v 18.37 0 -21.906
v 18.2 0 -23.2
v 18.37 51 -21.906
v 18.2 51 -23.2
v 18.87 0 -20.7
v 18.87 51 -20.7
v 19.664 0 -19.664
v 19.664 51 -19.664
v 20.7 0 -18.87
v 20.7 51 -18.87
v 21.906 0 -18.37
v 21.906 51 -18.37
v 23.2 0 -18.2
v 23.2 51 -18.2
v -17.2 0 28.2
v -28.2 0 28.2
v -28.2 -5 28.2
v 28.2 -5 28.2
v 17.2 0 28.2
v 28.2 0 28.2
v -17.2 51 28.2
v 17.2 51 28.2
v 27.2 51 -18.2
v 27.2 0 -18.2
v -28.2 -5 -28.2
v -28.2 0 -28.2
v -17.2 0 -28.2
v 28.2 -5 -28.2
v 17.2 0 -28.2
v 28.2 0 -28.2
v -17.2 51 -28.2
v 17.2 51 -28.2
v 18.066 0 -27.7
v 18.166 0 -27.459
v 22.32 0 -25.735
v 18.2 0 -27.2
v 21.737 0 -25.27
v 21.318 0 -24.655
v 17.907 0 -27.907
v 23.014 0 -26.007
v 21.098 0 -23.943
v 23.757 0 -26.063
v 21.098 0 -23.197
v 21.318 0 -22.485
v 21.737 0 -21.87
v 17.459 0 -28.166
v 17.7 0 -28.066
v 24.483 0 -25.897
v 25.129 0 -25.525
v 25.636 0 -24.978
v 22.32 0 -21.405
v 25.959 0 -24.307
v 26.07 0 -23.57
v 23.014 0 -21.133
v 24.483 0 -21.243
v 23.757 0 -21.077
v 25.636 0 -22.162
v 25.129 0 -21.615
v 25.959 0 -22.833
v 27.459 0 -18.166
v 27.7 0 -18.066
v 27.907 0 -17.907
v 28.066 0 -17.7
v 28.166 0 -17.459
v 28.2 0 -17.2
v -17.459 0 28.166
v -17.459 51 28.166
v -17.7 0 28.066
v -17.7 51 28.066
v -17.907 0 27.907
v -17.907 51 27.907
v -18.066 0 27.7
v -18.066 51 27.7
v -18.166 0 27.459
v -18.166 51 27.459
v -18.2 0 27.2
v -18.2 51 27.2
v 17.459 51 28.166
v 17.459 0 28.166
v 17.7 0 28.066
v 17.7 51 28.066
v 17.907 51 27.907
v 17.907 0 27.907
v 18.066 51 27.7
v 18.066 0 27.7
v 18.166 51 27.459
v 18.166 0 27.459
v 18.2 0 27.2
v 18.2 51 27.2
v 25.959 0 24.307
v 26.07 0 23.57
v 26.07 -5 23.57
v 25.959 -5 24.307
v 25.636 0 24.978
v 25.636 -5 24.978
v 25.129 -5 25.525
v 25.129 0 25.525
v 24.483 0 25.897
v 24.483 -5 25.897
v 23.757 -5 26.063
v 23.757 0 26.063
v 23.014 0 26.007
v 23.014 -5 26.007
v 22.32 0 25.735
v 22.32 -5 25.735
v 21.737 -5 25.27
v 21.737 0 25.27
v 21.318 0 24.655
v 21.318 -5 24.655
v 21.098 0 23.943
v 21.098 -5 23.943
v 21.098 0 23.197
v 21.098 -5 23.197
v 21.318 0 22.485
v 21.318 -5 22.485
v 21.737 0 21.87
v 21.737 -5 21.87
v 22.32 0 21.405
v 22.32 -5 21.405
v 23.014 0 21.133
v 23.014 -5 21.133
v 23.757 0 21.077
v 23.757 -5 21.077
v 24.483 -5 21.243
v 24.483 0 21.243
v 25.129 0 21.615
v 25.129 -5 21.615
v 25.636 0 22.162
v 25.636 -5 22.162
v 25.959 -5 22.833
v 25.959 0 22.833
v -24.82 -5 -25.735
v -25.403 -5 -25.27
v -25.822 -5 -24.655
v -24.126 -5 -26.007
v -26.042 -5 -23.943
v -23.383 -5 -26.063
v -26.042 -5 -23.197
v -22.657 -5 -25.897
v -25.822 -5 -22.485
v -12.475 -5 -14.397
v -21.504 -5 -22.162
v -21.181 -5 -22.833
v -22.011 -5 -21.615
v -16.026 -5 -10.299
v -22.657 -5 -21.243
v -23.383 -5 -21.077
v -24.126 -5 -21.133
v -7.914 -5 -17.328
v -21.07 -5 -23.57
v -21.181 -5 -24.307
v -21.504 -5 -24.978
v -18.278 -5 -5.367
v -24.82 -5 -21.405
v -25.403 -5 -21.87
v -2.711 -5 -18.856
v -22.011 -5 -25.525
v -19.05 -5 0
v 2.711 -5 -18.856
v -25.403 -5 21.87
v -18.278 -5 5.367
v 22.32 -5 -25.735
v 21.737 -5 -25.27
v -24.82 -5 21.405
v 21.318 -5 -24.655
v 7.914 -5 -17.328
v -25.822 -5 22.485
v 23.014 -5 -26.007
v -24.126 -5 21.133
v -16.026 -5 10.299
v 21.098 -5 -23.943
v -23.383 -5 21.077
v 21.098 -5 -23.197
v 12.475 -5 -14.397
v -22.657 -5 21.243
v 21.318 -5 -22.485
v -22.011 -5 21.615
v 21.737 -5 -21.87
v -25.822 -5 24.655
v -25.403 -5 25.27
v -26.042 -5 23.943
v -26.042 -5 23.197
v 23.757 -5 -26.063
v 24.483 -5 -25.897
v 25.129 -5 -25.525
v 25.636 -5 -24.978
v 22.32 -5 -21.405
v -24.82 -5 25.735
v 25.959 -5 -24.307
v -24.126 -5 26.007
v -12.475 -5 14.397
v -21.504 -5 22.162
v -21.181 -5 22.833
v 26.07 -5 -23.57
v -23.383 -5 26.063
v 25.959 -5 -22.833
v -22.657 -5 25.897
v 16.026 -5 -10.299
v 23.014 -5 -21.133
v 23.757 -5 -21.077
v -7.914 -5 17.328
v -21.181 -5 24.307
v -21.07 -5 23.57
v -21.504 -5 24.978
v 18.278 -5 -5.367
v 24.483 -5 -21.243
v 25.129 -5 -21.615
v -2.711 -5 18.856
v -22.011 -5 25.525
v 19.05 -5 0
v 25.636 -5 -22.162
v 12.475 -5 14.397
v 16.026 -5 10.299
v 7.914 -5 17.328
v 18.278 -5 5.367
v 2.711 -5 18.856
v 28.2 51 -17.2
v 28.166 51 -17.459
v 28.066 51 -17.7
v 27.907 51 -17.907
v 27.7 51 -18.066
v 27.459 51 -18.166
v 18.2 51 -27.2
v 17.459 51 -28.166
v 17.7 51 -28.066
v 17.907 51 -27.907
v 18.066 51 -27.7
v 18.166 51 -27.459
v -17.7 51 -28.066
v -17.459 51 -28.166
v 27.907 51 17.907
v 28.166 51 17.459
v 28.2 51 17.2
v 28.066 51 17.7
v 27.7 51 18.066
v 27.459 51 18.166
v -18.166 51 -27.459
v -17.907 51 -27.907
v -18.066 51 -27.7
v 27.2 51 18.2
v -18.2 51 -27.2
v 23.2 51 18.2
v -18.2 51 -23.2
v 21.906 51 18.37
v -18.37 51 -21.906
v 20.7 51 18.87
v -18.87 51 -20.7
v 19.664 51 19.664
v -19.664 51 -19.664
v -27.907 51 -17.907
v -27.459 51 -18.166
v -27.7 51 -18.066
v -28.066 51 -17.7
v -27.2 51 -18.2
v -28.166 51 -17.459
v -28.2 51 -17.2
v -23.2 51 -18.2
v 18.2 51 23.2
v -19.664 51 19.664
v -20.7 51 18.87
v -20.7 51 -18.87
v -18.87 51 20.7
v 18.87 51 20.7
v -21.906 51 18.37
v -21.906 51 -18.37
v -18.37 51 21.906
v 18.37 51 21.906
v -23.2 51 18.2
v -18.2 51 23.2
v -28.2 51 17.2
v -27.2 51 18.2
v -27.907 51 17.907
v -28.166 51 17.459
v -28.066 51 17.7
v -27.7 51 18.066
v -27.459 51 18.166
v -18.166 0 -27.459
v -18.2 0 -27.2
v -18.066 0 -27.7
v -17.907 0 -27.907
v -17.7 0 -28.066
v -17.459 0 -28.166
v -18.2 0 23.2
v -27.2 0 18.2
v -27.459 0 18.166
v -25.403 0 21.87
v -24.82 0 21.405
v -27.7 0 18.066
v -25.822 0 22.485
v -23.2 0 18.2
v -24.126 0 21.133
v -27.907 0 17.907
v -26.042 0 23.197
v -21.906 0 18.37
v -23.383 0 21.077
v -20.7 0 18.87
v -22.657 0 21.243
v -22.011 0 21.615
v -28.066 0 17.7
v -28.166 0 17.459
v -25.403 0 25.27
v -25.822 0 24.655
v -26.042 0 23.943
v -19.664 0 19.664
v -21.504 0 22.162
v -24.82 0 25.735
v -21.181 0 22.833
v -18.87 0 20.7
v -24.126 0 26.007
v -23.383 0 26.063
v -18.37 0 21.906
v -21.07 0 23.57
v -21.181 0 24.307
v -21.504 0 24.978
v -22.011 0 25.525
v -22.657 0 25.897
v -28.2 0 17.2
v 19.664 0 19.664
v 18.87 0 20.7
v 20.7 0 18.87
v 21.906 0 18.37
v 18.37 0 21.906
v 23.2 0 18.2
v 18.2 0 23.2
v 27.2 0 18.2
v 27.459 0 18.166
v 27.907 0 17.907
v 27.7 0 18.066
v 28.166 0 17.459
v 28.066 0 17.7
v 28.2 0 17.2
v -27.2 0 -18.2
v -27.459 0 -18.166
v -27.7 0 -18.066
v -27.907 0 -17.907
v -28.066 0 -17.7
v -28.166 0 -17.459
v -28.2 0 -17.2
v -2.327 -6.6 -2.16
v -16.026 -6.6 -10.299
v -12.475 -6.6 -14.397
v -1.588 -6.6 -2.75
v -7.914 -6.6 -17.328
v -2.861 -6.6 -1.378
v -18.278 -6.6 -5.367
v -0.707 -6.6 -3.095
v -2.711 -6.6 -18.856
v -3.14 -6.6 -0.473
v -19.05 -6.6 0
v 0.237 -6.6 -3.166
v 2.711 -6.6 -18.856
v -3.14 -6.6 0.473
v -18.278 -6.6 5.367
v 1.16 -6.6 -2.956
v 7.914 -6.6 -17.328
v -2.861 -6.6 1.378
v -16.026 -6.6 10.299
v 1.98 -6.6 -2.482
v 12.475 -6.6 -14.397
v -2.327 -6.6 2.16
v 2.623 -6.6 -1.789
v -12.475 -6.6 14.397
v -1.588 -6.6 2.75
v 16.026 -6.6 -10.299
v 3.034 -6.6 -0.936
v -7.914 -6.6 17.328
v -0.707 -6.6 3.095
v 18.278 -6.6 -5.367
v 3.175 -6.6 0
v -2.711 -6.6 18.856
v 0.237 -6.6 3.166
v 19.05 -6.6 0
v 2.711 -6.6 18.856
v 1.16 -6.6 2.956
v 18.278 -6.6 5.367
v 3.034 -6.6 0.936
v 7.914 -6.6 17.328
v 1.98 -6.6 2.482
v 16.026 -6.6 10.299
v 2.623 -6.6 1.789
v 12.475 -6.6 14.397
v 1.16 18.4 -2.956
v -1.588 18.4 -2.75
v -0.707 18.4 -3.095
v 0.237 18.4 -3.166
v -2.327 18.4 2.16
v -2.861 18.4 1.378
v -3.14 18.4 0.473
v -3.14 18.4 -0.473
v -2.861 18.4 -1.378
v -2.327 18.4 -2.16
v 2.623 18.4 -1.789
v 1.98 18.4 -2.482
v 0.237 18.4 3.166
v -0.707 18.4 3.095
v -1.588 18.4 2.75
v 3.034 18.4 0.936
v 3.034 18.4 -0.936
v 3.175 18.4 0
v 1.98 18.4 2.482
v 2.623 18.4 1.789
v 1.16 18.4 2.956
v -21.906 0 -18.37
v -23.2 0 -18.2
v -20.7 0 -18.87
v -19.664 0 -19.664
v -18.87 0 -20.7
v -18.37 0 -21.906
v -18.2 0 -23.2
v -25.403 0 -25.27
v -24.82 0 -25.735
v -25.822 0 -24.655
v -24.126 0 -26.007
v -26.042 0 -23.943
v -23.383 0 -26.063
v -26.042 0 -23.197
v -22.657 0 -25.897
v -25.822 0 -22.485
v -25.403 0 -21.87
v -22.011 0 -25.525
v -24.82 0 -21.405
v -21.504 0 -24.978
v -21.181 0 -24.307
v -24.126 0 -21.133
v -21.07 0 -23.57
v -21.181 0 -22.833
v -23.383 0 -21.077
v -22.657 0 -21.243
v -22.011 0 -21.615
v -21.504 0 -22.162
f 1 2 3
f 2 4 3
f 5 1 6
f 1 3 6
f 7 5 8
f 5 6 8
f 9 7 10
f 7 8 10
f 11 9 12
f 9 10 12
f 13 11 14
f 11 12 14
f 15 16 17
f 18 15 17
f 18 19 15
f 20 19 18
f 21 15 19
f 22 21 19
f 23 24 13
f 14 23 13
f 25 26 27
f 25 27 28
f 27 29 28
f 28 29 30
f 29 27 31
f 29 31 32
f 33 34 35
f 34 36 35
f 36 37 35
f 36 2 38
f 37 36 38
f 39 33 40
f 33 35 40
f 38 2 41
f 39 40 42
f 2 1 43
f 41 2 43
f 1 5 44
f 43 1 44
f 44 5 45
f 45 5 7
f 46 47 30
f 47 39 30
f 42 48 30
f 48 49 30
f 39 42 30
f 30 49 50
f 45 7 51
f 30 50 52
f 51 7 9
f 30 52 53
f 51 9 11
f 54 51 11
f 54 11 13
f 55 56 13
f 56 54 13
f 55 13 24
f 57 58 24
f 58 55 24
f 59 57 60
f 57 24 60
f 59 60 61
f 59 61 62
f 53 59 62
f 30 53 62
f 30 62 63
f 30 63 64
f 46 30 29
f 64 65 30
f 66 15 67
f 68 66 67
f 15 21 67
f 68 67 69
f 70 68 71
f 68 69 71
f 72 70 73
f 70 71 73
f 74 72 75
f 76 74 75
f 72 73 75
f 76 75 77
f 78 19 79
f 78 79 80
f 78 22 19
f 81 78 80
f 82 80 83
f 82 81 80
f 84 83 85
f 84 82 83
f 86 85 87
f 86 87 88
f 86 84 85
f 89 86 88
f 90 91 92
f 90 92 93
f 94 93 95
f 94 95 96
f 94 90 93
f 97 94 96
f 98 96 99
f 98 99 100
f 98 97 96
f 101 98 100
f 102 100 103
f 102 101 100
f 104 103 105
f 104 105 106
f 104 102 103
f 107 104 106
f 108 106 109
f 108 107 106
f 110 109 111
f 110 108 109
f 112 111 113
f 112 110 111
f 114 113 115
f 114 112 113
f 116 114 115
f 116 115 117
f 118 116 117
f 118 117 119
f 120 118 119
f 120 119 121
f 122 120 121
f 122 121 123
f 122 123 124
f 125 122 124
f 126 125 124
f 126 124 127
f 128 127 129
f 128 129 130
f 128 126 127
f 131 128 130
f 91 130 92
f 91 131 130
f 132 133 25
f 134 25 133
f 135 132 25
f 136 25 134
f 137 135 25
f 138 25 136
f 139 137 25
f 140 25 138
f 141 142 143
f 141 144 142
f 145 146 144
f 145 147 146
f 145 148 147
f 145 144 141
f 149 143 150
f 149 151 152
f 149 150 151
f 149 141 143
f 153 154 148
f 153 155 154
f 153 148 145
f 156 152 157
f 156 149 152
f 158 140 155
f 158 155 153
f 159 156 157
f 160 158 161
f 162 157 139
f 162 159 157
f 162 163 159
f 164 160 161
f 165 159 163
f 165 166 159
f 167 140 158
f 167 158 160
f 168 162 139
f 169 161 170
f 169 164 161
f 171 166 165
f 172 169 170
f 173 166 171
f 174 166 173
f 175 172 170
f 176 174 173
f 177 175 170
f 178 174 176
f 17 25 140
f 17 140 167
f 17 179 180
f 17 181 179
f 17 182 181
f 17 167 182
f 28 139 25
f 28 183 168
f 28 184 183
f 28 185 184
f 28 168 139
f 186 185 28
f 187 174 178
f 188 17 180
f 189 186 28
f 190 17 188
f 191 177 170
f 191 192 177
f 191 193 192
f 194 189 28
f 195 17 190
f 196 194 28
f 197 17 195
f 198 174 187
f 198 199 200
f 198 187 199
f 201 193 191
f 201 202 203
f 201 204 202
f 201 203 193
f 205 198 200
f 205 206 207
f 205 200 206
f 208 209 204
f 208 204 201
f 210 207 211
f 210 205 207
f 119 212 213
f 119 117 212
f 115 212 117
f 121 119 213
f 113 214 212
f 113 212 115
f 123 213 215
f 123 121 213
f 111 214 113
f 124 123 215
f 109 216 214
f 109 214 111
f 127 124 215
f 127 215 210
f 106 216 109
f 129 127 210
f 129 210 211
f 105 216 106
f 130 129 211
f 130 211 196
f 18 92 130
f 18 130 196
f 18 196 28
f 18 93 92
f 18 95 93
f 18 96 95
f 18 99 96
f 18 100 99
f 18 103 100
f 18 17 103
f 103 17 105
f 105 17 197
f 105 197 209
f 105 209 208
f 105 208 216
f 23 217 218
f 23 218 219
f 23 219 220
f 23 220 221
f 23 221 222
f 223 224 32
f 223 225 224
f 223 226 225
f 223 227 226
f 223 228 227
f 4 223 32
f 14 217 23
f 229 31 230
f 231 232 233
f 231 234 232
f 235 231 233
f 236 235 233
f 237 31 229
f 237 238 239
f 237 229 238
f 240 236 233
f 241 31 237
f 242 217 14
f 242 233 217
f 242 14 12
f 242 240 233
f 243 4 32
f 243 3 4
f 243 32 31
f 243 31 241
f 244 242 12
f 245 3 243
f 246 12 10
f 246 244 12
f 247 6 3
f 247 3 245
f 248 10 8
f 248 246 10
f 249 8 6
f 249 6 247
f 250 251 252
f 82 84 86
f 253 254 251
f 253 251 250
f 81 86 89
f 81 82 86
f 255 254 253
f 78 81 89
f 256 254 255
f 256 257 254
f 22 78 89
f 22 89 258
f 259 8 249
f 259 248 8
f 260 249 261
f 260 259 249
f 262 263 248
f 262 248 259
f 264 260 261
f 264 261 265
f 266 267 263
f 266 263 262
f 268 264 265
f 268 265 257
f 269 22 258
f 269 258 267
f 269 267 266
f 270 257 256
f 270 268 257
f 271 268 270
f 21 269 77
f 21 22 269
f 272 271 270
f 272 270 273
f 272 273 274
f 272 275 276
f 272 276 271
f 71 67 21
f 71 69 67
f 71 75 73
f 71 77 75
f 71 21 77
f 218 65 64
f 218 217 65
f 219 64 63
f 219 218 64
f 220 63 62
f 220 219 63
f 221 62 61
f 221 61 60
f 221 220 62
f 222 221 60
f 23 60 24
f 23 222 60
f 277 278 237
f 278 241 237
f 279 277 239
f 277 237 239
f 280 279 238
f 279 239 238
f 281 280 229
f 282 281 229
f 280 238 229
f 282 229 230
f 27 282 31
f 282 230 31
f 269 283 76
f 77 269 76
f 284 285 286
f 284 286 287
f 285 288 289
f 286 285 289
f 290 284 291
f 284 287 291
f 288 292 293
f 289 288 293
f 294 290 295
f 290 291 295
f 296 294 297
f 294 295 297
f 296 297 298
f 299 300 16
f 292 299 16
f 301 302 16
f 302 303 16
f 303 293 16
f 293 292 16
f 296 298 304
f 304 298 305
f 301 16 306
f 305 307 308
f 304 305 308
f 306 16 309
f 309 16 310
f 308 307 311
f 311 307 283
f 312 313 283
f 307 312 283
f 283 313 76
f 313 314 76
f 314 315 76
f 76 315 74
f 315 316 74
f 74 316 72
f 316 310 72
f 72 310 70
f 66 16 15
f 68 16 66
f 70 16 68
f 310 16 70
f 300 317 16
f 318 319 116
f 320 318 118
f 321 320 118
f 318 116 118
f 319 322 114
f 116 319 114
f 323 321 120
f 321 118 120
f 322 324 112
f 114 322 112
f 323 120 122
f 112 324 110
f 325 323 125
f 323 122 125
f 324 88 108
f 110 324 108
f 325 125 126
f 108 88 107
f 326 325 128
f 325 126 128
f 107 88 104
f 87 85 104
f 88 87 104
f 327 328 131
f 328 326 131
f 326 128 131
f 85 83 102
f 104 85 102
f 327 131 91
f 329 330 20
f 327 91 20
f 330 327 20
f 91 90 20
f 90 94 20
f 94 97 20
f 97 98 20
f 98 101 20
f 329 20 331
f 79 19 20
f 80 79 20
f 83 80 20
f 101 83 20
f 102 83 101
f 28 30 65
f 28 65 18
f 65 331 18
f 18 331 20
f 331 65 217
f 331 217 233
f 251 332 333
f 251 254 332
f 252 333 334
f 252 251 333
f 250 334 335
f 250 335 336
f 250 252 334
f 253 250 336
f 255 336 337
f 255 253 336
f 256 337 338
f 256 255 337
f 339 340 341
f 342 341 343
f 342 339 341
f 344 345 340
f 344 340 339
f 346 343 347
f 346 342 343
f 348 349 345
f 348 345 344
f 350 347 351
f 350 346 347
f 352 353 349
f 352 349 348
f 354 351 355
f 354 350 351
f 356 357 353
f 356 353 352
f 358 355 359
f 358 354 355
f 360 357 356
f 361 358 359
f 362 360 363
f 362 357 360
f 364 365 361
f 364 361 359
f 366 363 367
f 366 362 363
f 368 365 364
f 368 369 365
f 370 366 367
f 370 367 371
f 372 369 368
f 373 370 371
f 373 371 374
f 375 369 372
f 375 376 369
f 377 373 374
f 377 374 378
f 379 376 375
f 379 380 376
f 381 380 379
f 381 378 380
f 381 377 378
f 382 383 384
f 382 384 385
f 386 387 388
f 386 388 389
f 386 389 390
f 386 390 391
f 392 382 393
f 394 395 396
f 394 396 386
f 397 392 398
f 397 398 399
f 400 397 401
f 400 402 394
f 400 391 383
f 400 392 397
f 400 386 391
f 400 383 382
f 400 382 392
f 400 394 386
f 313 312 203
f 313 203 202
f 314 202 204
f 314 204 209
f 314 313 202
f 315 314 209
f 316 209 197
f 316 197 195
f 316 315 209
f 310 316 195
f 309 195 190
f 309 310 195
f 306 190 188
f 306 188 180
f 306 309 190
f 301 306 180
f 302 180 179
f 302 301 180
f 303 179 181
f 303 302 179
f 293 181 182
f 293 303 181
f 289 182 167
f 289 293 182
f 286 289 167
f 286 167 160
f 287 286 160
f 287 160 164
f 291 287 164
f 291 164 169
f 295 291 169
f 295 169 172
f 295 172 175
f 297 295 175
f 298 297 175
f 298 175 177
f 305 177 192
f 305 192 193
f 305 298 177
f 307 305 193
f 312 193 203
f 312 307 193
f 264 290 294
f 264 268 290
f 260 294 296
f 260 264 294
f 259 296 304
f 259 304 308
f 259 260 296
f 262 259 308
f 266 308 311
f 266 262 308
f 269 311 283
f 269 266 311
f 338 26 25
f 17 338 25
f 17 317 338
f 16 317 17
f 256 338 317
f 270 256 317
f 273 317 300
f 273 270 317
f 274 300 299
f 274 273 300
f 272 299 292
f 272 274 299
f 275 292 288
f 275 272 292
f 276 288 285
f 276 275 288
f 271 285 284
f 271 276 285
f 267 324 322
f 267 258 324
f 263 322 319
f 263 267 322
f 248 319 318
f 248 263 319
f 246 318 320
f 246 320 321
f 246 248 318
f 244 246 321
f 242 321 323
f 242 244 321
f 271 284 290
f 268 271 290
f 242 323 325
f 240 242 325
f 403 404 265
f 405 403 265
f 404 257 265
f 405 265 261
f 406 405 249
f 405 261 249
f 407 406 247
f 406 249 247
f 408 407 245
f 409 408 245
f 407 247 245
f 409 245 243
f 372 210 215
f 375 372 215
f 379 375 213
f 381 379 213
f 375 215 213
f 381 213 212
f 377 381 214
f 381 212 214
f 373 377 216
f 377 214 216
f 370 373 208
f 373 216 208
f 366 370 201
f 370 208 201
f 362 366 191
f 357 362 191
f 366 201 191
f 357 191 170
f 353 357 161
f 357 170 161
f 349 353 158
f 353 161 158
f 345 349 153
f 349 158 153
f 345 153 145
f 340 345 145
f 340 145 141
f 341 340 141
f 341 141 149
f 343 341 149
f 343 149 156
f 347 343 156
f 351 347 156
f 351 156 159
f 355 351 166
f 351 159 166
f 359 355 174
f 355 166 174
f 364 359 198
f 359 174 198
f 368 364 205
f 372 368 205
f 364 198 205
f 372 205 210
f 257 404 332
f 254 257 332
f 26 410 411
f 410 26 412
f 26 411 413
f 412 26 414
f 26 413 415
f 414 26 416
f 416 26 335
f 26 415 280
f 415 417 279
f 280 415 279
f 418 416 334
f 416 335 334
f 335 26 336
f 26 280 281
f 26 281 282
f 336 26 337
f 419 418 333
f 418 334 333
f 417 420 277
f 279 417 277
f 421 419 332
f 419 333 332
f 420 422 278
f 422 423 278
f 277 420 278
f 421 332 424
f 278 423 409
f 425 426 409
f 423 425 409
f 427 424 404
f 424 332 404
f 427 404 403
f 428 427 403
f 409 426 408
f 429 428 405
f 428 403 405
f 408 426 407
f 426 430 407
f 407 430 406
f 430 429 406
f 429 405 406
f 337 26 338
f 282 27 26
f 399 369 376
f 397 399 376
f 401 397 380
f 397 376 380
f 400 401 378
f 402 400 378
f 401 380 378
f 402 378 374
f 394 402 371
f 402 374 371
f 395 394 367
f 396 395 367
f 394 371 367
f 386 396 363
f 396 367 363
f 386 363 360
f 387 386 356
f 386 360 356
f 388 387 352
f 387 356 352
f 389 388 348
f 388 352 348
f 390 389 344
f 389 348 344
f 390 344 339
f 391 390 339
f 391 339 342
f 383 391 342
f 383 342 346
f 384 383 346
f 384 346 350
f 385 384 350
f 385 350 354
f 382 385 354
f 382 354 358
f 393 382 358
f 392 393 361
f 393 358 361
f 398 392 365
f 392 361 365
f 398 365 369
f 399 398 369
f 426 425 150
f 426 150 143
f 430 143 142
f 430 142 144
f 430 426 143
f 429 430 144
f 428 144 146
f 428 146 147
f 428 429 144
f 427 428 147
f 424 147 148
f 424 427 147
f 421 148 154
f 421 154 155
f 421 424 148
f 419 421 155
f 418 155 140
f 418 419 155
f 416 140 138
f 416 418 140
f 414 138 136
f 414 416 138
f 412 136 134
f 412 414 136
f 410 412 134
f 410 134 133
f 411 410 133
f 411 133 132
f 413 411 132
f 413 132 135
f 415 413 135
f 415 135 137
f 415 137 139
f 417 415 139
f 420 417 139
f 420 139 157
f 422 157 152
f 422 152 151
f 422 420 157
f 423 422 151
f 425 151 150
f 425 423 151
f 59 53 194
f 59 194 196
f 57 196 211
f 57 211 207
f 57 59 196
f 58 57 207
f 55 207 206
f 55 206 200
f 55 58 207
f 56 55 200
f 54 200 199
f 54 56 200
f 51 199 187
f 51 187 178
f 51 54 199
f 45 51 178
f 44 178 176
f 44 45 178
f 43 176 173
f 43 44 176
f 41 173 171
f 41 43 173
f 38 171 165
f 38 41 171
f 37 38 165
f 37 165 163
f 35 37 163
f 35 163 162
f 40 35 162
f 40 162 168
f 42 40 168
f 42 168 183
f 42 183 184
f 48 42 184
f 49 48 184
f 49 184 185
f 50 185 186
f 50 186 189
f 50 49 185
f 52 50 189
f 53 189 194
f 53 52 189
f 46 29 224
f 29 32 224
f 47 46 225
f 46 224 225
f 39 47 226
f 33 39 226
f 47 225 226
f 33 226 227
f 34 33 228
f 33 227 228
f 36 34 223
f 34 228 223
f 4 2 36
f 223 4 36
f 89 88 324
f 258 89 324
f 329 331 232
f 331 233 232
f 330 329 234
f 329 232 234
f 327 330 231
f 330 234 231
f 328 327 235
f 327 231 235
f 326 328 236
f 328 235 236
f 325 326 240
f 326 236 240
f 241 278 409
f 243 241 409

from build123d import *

# Parameters (mm, degrees)
F0_W     = 56.4
F0_H     = 56.4
F0_R     = 2.5
F1_DEPTH = 5
F3_DEPTH = 51
F4_R     = 5
F5_R     = 1
F6_R     = 19.05
F7_DEPTH = 1.6
F8_R     = 3.175
F9_DEPTH = 25


with BuildPart() as f1:
    # F0 (on Front) → F1 (new body)
    with BuildSketch(Plane.XZ):
        Rectangle(F0_W, F0_H)
        with Locations((-23.57, -23.57)):
            Circle(F0_R, mode=Mode.SUBTRACT)
        with Locations((23.57, -23.57)):
            Circle(F0_R, mode=Mode.SUBTRACT)
        with Locations((-23.57, 23.57)):
            Circle(F0_R, mode=Mode.SUBTRACT)
        with Locations((23.57, 23.57)):
            Circle(F0_R, mode=Mode.SUBTRACT)
    extrude(amount=F1_DEPTH)

    # F2 (on face) → F3 (join)
    with BuildSketch(Plane(origin=(0, 0, 0), x_dir=(-1, 0, 0), z_dir=(0, 1, 0))):
        Polygon((18.2, 18.2), (18.2, 28.2), (0, 28.2), (-18.2, 28.2), (-18.2, 18.2), (-28.2, 18.2), (-28.2, 0), (-28.2, -18.2), (-18.2, -18.2), (-18.2, -28.2), (0, -28.2), (18.2, -28.2), (18.2, -18.2), (28.2, -18.2), (28.2, 0), (28.2, 18.2), align=None)
    extrude(amount=F3_DEPTH)

    # F4
    f4_edges = [f1.edges().sort_by_distance(p)[0] for p in [
        (18.2, 25.5, 18.2),
        (18.2, 25.5, -18.2),
        (-18.2, 25.5, -18.2),
        (-18.2, 25.5, 18.2),
    ]]
    fillet(f4_edges, radius=F4_R)

    # F5
    f5_edges = [f1.edges().sort_by_distance(p)[0] for p in [
        (28.2, 25.5, 18.2),
        (18.2, 25.5, 28.2),
        (-18.2, 25.5, 28.2),
        (28.2, 25.5, -18.2),
        (18.2, 25.5, -28.2),
        (-18.2, 25.5, -28.2),
        (-28.2, 25.5, -18.2),
        (-28.2, 25.5, 18.2),
    ]]
    fillet(f5_edges, radius=F5_R)

    # F6 (on face) → F7 (join)
    with BuildSketch(Plane.XZ.offset(5)):
        Circle(F6_R)
    extrude(amount=F7_DEPTH)

    # F8 (on face) → F9 (cut)
    with BuildSketch(Plane.XZ.offset(6.6)):
        Circle(F8_R)
    extrude(amount=-F9_DEPTH, mode=Mode.SUBTRACT)


solid = f1.part
